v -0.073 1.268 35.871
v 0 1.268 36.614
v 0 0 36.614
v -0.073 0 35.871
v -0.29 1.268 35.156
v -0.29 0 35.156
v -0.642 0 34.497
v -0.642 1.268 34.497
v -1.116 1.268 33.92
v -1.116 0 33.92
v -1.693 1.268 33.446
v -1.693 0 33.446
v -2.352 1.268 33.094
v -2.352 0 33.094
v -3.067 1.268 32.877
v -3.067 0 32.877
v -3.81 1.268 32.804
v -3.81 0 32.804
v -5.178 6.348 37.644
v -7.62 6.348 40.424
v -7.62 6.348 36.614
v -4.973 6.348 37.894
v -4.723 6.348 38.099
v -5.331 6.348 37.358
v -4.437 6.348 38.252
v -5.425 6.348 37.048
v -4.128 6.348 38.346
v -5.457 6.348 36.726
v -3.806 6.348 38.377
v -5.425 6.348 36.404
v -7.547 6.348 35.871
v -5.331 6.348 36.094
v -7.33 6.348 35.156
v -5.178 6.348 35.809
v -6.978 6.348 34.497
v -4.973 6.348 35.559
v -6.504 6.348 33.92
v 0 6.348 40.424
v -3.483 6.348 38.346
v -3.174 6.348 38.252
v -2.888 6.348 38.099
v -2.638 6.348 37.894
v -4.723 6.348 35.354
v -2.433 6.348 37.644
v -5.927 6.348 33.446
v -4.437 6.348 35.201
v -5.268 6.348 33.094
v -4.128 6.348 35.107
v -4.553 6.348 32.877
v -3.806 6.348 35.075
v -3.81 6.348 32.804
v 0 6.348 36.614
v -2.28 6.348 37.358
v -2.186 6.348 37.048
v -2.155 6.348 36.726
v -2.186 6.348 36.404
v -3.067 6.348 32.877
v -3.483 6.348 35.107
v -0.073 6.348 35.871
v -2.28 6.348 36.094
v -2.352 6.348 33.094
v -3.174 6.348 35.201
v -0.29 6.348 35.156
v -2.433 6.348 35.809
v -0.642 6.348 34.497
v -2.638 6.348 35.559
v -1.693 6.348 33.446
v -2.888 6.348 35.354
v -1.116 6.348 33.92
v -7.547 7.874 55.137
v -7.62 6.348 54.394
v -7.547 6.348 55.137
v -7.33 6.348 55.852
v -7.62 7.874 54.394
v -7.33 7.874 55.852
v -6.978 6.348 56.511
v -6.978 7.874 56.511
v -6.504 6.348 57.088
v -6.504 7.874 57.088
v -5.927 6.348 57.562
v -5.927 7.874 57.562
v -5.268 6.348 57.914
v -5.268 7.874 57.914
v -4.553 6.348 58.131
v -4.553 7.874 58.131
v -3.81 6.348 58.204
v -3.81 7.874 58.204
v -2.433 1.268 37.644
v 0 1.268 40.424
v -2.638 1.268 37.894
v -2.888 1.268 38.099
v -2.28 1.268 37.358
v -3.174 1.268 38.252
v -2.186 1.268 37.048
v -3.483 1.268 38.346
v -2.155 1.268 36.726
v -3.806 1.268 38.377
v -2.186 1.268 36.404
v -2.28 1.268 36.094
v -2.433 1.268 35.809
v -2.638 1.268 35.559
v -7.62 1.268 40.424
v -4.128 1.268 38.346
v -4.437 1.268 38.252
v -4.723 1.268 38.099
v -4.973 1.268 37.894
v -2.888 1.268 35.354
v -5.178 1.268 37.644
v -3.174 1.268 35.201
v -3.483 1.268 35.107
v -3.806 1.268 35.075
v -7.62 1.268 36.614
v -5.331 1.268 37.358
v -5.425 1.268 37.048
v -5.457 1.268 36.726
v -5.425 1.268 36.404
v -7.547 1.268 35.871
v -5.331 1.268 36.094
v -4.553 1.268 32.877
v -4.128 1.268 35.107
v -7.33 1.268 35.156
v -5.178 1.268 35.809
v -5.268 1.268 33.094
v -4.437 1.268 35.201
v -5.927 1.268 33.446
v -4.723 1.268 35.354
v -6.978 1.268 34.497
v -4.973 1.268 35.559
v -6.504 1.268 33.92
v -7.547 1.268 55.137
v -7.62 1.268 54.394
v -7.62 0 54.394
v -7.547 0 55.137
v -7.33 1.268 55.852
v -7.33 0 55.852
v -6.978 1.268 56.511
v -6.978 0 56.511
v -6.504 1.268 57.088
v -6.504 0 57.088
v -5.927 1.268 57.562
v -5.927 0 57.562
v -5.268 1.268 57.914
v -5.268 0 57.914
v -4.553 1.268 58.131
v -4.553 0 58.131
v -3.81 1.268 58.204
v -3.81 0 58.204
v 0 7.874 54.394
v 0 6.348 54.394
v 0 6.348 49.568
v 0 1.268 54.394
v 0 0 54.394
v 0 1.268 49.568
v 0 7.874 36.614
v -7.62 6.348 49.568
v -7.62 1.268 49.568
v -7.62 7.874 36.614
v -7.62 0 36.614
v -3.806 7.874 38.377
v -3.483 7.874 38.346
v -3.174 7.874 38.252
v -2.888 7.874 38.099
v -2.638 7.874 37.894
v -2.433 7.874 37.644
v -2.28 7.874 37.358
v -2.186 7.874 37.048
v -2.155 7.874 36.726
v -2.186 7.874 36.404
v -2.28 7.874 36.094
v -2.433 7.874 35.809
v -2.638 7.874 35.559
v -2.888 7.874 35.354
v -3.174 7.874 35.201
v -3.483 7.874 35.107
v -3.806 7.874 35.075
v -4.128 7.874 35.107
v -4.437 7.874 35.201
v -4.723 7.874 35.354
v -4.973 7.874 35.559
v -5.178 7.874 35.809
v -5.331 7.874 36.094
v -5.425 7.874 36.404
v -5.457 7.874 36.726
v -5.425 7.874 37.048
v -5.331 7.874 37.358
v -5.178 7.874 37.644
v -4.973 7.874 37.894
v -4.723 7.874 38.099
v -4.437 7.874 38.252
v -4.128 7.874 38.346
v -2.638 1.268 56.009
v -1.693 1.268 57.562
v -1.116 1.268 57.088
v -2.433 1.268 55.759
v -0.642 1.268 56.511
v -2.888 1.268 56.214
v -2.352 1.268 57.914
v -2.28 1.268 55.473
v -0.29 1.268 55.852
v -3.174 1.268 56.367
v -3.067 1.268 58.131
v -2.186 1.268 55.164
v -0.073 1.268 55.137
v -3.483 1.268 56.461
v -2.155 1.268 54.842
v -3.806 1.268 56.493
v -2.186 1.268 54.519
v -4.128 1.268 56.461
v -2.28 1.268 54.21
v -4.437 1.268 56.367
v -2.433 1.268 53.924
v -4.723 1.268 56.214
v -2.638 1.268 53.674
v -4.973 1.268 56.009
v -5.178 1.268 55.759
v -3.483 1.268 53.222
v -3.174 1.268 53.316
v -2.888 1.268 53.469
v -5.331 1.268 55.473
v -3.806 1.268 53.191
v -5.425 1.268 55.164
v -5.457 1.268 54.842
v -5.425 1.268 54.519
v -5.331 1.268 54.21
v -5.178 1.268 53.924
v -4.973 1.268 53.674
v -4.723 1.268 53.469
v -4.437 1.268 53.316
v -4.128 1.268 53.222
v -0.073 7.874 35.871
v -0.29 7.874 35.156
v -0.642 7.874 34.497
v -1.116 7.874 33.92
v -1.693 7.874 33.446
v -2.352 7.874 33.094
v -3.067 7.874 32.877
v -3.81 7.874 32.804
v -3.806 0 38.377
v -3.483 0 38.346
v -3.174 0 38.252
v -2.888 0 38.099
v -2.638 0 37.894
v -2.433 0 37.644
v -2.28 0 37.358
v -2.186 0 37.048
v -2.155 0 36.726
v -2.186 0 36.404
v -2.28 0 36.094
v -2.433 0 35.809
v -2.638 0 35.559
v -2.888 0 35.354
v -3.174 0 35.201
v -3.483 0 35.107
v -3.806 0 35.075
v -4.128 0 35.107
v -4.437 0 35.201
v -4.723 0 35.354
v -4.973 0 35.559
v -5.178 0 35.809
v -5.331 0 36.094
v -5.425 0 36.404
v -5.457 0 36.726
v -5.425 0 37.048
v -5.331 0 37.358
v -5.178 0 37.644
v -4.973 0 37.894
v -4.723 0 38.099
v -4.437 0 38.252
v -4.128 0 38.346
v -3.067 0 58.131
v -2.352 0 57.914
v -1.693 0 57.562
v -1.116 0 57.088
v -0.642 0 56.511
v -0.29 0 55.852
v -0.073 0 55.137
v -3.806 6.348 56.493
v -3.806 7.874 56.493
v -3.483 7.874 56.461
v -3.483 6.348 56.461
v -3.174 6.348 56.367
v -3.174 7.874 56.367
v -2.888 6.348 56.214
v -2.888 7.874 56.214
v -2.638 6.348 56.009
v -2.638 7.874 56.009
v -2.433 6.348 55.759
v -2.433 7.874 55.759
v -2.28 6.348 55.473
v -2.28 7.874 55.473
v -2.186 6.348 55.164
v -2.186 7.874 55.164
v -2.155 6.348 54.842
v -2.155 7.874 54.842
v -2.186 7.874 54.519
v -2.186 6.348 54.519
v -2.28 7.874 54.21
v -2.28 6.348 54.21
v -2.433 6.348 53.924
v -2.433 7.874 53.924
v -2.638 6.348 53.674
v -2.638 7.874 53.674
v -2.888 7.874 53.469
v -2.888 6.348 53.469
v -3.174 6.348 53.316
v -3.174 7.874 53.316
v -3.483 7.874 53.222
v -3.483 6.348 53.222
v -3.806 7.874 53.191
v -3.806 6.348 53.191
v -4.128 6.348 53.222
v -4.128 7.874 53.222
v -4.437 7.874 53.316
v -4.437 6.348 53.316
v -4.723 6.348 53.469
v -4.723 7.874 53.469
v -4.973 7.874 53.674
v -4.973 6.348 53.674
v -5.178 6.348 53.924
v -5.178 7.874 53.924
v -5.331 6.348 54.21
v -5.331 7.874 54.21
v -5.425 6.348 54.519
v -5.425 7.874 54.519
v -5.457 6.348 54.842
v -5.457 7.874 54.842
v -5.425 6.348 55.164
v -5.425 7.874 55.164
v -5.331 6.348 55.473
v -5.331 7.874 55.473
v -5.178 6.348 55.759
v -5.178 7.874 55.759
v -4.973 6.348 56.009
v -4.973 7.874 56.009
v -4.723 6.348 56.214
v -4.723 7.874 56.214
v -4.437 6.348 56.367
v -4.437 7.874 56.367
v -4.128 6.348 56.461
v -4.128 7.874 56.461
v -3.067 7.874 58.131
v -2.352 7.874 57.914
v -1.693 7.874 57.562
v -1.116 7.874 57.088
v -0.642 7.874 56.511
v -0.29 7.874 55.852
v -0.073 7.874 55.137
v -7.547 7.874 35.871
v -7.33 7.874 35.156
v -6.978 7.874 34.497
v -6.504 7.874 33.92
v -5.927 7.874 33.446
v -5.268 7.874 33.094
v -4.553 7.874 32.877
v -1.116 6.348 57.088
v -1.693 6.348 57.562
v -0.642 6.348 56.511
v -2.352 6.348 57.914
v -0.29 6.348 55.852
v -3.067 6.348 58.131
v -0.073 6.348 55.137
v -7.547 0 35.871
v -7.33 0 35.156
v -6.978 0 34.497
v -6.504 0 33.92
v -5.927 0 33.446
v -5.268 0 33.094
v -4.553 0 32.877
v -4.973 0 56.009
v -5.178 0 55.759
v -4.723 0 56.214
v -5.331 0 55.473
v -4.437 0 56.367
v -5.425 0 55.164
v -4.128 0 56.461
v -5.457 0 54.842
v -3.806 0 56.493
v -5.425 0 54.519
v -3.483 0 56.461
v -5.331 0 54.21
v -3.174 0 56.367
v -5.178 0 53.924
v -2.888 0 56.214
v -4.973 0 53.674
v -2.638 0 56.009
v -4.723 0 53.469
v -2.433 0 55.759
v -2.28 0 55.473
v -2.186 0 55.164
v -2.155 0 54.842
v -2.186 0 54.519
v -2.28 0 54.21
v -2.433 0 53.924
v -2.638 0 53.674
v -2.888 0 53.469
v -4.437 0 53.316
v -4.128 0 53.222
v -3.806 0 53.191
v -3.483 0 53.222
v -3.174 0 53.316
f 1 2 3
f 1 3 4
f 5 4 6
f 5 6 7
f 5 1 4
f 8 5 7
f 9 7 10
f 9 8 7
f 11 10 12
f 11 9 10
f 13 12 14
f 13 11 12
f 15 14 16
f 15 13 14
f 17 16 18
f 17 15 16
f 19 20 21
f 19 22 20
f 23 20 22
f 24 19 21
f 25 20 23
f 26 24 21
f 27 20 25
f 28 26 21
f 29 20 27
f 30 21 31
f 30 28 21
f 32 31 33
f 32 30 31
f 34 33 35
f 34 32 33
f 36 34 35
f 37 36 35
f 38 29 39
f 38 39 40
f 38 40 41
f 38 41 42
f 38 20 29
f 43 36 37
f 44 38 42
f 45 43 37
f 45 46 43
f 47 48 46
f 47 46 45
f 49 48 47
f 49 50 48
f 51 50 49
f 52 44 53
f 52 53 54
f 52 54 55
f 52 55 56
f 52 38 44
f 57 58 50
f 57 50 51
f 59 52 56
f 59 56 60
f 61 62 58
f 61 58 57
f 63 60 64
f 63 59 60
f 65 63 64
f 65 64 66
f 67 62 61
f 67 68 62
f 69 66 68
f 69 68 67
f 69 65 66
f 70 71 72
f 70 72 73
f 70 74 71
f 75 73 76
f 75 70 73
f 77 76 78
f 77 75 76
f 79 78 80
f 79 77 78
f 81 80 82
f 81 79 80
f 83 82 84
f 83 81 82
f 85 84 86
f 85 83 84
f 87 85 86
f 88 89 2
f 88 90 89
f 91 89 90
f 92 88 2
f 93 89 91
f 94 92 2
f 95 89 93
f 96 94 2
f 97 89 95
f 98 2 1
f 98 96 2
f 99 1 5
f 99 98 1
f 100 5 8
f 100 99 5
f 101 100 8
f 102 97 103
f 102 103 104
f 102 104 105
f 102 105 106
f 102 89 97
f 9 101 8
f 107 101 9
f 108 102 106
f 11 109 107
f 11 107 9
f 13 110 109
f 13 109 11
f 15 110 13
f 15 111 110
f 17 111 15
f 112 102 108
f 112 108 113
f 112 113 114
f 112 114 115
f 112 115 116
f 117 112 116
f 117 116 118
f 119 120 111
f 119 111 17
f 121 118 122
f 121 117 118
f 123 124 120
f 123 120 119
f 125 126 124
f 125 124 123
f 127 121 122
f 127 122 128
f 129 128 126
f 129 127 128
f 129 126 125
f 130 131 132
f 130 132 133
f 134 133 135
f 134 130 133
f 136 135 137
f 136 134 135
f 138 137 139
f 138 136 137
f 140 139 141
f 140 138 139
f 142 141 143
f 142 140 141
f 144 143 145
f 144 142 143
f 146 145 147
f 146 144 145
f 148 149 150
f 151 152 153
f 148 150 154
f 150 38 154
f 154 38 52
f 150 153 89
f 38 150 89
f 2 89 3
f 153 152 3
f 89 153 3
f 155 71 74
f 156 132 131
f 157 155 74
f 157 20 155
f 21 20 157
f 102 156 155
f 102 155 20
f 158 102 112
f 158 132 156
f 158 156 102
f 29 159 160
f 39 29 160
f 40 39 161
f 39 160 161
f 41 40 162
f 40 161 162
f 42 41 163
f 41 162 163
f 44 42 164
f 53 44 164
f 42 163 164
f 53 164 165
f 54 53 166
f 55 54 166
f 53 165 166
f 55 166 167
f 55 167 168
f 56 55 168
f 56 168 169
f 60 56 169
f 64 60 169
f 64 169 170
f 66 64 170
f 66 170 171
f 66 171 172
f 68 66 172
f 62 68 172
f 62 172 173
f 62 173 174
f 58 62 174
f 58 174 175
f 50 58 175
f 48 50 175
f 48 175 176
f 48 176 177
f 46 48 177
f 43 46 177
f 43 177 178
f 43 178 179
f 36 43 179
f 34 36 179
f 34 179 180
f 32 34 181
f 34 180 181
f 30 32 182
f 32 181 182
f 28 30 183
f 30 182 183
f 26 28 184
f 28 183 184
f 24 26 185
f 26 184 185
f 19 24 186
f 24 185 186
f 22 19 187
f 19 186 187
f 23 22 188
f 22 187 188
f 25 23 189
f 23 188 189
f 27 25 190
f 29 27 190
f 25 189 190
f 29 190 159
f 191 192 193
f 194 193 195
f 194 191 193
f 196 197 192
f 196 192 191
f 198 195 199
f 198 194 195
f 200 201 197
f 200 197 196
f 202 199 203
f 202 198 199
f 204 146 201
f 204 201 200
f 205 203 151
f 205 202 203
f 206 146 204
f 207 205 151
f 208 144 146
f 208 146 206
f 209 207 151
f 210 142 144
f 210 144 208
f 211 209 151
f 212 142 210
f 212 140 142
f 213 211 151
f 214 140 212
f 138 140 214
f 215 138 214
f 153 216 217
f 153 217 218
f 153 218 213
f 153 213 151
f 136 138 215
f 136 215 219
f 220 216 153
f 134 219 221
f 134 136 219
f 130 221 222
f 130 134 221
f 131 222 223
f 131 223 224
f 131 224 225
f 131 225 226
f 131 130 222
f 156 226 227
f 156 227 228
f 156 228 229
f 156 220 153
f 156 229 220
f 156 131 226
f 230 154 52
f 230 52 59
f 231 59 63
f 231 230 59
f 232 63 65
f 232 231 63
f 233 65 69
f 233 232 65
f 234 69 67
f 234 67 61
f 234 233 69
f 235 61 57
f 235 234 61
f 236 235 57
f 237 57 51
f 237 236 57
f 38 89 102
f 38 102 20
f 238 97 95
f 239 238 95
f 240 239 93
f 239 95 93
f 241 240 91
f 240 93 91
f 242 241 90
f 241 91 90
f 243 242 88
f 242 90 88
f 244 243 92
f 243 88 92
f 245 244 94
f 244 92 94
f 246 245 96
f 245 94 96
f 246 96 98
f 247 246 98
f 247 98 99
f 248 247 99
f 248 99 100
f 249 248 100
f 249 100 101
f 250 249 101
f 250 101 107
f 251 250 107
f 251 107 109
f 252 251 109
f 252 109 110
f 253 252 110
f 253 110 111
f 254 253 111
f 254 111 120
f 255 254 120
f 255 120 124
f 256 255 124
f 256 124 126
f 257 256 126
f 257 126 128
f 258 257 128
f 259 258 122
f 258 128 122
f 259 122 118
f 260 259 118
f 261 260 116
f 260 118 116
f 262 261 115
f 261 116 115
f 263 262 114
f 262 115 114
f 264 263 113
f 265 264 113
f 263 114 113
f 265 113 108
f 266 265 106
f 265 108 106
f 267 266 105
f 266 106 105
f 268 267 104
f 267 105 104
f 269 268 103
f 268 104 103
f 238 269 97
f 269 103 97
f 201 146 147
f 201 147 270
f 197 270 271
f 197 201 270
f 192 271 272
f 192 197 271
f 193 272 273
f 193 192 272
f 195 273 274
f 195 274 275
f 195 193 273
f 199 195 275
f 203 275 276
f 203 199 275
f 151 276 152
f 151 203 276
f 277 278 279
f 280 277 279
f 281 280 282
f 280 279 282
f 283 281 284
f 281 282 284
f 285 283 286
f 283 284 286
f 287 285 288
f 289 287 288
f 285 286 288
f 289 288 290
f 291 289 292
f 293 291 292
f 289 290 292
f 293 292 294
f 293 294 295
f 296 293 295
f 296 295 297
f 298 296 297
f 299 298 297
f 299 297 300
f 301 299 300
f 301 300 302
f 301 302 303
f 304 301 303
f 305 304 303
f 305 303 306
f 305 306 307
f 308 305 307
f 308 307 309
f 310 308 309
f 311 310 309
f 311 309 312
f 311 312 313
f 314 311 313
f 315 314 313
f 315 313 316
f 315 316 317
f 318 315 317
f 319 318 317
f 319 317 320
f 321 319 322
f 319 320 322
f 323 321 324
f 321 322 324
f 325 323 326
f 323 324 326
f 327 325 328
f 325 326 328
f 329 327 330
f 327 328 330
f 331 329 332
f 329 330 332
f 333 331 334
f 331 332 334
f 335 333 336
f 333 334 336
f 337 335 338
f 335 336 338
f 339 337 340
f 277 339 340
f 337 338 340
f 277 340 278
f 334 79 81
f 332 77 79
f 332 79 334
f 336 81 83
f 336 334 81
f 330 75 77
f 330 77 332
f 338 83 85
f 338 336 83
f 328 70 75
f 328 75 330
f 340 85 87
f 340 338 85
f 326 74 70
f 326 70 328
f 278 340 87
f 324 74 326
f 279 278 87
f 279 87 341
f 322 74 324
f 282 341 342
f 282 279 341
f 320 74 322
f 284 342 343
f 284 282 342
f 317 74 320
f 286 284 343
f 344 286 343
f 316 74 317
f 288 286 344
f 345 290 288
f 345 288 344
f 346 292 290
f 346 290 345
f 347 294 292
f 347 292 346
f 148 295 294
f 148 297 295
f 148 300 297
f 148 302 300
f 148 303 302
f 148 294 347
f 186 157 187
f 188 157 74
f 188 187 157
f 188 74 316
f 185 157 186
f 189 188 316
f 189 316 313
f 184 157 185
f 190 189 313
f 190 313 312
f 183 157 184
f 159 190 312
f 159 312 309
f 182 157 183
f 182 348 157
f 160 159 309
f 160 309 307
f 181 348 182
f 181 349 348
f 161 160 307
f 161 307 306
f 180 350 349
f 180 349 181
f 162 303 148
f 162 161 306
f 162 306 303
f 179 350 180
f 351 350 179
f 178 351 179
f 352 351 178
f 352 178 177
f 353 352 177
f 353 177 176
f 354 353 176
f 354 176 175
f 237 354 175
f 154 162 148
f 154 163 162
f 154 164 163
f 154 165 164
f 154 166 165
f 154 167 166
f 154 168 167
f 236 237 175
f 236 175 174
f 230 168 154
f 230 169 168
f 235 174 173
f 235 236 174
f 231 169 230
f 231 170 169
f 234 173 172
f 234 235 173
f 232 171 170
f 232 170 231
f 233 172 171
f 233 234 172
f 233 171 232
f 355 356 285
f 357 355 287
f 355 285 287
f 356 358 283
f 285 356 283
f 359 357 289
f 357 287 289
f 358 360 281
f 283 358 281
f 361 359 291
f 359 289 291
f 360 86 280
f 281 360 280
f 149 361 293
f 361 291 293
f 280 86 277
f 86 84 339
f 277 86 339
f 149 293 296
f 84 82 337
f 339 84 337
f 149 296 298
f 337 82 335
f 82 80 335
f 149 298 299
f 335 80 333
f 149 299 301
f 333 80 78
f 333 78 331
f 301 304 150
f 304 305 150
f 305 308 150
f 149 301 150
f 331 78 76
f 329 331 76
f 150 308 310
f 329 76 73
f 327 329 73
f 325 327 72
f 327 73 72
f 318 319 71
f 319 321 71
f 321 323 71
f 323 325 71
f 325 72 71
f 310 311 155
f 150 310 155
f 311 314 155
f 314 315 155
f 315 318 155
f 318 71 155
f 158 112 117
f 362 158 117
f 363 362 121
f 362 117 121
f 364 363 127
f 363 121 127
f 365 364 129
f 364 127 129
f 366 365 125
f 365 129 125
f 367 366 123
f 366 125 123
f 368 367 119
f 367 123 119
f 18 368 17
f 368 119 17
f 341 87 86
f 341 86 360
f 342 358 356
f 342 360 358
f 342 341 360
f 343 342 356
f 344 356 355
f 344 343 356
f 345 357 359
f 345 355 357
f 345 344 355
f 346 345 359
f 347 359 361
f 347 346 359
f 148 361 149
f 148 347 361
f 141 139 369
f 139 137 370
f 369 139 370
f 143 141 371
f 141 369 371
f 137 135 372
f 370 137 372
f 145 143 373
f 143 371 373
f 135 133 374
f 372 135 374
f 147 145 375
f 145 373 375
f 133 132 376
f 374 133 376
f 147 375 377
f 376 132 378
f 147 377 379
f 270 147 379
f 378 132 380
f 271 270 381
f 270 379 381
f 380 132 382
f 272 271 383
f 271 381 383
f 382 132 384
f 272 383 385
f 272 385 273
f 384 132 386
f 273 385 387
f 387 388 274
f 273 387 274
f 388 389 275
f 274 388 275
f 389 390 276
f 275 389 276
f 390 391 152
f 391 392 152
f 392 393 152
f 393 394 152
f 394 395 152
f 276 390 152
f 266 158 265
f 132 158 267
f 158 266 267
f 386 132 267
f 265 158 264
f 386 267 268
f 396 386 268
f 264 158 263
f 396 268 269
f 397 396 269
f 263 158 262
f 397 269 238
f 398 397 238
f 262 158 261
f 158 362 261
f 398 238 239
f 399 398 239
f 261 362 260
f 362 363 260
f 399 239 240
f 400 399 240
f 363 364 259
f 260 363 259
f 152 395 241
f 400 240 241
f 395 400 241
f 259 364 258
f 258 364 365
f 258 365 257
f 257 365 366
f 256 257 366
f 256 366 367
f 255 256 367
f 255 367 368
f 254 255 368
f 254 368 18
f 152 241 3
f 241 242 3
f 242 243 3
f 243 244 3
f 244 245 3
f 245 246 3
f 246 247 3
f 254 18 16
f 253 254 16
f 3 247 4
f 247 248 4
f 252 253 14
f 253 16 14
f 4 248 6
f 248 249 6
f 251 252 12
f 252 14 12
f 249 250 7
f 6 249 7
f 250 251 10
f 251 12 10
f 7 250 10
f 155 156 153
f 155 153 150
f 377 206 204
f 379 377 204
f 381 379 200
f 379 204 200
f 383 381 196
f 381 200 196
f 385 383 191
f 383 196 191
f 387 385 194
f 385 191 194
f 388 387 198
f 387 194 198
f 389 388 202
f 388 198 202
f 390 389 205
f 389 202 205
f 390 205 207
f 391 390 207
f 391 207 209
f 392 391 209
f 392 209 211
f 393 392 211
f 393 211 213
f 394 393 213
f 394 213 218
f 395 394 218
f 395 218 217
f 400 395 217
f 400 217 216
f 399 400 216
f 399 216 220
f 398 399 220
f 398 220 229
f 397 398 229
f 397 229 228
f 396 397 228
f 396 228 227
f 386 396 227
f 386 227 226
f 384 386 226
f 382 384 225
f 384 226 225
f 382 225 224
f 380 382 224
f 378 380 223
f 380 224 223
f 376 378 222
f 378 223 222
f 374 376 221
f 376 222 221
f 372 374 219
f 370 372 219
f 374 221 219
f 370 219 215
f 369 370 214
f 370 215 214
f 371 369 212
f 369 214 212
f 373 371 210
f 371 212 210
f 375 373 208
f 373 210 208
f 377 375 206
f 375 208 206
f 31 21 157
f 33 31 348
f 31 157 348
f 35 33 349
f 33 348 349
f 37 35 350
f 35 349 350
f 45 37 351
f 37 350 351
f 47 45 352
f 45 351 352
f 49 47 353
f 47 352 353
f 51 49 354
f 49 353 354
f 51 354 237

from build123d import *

# Parameters (mm, degrees)
SKETCH1_W               = 7.62
SKETCH1_H               = 25.4
EXTRUDE_THIN1_DEPTH     = 7.874
FILLET1_R               = 3.81
SKETCH3_R               = 1.651
CUT_EXTRUDE1_DEPTH      = 7.874
LPATTERN1_COUNT         = 2
LPATTERN1_PITCH         = 18.11528
SKETCH5_W               = 3.81
SKETCH5_H               = 5.08
CUT_EXTRUDE_THIN1_DEPTH = 60.226546789
CUT_EXTRUDE_THIN2_START = -7.874
SKETCH5_3_W             = 5.08
SKETCH5_3_H             = 5.08
CUT_EXTRUDE_THIN2_DEPTH = 68.100546789
LPATTERN2_COUNT         = 2
LPATTERN2_PITCH         = 18.034
LPATTERN4_COUNT         = 2
LPATTERN4_PITCH         = 18.034


with BuildPart() as part:
    # Sketch1 → Extrude-Thin1 (new body)
    with BuildSketch(Plane(origin=(0, 0, 0), x_dir=(1, 0, 0), z_dir=(0, 1, 0))):
        with Locations((-3.81, -45.504119859)):
            Rectangle(SKETCH1_W, SKETCH1_H)
    extrude(amount=EXTRUDE_THIN1_DEPTH)

    # Fillet1
    fillet1_edges = [part.edges().sort_by_distance(p)[0] for p in [
        (-7.62, 3.937, 32.804119859),
        (0, 3.937, 32.804119859),
        (0, 3.937, 58.204119859),
        (-7.62, 3.937, 58.204119859),
    ]]
    fillet(fillet1_edges, radius=FILLET1_R - 0.0001)  # a hair under: the kernel refuses the full size

    # Sketch3 → Cut-Extrude1 (cut)
    with BuildSketch(Plane(origin=(0, 7.874, 0), x_dir=(1, 0, 0), z_dir=(0, 1, 0))):
        with Locations(Location((-3.805586637, -54.841580585, 0), (0, 0, 270))):
            Circle(SKETCH3_R)
    cut_extrude1 = extrude(amount=-CUT_EXTRUDE1_DEPTH, mode=Mode.SUBTRACT)

    # LPattern1: Cut-Extrude1 ×2
    with Locations(*[(0, 0, -i * LPATTERN1_PITCH) for i in range(1, LPATTERN1_COUNT)]):
        add(cut_extrude1, mode=Mode.SUBTRACT)

    # Sketch5 → Cut-Extrude-Thin1 (cut, symmetric)
    with BuildSketch(Plane(origin=(0, 0, 0), x_dir=(0, 0, -1), z_dir=(1, 0, 0))):
        with Locations((-38.519119859, 3.808272384)):
            Rectangle(SKETCH5_W, SKETCH5_H)
    cut_extrude_thin1 = extrude(amount=CUT_EXTRUDE_THIN1_DEPTH, both=True, mode=Mode.SUBTRACT)

    # Sketch5<3> → Cut-Extrude-Thin2 (cut)
    with BuildSketch(Plane(origin=(0, 0, 0), x_dir=(0, 0, -1), z_dir=(1, 0, 0)).offset(CUT_EXTRUDE_THIN2_START)):
        with Locations((-34.074119859, 3.808272384)):
            Rectangle(SKETCH5_3_W, SKETCH5_3_H)
    cut_extrude_thin2 = extrude(amount=CUT_EXTRUDE_THIN2_DEPTH, mode=Mode.SUBTRACT)

    # LPattern2: Cut-Extrude-Thin2 ×2
    with Locations(*[(0, 0, i * LPATTERN2_PITCH) for i in range(1, LPATTERN2_COUNT)]):
        add(cut_extrude_thin2, mode=Mode.SUBTRACT)

    # LPattern4: Cut-Extrude-Thin1 ×2
    with Locations(*[(0, 0, i * LPATTERN4_PITCH) for i in range(1, LPATTERN4_COUNT)]):
        add(cut_extrude_thin1, mode=Mode.SUBTRACT)


solid = part.part
